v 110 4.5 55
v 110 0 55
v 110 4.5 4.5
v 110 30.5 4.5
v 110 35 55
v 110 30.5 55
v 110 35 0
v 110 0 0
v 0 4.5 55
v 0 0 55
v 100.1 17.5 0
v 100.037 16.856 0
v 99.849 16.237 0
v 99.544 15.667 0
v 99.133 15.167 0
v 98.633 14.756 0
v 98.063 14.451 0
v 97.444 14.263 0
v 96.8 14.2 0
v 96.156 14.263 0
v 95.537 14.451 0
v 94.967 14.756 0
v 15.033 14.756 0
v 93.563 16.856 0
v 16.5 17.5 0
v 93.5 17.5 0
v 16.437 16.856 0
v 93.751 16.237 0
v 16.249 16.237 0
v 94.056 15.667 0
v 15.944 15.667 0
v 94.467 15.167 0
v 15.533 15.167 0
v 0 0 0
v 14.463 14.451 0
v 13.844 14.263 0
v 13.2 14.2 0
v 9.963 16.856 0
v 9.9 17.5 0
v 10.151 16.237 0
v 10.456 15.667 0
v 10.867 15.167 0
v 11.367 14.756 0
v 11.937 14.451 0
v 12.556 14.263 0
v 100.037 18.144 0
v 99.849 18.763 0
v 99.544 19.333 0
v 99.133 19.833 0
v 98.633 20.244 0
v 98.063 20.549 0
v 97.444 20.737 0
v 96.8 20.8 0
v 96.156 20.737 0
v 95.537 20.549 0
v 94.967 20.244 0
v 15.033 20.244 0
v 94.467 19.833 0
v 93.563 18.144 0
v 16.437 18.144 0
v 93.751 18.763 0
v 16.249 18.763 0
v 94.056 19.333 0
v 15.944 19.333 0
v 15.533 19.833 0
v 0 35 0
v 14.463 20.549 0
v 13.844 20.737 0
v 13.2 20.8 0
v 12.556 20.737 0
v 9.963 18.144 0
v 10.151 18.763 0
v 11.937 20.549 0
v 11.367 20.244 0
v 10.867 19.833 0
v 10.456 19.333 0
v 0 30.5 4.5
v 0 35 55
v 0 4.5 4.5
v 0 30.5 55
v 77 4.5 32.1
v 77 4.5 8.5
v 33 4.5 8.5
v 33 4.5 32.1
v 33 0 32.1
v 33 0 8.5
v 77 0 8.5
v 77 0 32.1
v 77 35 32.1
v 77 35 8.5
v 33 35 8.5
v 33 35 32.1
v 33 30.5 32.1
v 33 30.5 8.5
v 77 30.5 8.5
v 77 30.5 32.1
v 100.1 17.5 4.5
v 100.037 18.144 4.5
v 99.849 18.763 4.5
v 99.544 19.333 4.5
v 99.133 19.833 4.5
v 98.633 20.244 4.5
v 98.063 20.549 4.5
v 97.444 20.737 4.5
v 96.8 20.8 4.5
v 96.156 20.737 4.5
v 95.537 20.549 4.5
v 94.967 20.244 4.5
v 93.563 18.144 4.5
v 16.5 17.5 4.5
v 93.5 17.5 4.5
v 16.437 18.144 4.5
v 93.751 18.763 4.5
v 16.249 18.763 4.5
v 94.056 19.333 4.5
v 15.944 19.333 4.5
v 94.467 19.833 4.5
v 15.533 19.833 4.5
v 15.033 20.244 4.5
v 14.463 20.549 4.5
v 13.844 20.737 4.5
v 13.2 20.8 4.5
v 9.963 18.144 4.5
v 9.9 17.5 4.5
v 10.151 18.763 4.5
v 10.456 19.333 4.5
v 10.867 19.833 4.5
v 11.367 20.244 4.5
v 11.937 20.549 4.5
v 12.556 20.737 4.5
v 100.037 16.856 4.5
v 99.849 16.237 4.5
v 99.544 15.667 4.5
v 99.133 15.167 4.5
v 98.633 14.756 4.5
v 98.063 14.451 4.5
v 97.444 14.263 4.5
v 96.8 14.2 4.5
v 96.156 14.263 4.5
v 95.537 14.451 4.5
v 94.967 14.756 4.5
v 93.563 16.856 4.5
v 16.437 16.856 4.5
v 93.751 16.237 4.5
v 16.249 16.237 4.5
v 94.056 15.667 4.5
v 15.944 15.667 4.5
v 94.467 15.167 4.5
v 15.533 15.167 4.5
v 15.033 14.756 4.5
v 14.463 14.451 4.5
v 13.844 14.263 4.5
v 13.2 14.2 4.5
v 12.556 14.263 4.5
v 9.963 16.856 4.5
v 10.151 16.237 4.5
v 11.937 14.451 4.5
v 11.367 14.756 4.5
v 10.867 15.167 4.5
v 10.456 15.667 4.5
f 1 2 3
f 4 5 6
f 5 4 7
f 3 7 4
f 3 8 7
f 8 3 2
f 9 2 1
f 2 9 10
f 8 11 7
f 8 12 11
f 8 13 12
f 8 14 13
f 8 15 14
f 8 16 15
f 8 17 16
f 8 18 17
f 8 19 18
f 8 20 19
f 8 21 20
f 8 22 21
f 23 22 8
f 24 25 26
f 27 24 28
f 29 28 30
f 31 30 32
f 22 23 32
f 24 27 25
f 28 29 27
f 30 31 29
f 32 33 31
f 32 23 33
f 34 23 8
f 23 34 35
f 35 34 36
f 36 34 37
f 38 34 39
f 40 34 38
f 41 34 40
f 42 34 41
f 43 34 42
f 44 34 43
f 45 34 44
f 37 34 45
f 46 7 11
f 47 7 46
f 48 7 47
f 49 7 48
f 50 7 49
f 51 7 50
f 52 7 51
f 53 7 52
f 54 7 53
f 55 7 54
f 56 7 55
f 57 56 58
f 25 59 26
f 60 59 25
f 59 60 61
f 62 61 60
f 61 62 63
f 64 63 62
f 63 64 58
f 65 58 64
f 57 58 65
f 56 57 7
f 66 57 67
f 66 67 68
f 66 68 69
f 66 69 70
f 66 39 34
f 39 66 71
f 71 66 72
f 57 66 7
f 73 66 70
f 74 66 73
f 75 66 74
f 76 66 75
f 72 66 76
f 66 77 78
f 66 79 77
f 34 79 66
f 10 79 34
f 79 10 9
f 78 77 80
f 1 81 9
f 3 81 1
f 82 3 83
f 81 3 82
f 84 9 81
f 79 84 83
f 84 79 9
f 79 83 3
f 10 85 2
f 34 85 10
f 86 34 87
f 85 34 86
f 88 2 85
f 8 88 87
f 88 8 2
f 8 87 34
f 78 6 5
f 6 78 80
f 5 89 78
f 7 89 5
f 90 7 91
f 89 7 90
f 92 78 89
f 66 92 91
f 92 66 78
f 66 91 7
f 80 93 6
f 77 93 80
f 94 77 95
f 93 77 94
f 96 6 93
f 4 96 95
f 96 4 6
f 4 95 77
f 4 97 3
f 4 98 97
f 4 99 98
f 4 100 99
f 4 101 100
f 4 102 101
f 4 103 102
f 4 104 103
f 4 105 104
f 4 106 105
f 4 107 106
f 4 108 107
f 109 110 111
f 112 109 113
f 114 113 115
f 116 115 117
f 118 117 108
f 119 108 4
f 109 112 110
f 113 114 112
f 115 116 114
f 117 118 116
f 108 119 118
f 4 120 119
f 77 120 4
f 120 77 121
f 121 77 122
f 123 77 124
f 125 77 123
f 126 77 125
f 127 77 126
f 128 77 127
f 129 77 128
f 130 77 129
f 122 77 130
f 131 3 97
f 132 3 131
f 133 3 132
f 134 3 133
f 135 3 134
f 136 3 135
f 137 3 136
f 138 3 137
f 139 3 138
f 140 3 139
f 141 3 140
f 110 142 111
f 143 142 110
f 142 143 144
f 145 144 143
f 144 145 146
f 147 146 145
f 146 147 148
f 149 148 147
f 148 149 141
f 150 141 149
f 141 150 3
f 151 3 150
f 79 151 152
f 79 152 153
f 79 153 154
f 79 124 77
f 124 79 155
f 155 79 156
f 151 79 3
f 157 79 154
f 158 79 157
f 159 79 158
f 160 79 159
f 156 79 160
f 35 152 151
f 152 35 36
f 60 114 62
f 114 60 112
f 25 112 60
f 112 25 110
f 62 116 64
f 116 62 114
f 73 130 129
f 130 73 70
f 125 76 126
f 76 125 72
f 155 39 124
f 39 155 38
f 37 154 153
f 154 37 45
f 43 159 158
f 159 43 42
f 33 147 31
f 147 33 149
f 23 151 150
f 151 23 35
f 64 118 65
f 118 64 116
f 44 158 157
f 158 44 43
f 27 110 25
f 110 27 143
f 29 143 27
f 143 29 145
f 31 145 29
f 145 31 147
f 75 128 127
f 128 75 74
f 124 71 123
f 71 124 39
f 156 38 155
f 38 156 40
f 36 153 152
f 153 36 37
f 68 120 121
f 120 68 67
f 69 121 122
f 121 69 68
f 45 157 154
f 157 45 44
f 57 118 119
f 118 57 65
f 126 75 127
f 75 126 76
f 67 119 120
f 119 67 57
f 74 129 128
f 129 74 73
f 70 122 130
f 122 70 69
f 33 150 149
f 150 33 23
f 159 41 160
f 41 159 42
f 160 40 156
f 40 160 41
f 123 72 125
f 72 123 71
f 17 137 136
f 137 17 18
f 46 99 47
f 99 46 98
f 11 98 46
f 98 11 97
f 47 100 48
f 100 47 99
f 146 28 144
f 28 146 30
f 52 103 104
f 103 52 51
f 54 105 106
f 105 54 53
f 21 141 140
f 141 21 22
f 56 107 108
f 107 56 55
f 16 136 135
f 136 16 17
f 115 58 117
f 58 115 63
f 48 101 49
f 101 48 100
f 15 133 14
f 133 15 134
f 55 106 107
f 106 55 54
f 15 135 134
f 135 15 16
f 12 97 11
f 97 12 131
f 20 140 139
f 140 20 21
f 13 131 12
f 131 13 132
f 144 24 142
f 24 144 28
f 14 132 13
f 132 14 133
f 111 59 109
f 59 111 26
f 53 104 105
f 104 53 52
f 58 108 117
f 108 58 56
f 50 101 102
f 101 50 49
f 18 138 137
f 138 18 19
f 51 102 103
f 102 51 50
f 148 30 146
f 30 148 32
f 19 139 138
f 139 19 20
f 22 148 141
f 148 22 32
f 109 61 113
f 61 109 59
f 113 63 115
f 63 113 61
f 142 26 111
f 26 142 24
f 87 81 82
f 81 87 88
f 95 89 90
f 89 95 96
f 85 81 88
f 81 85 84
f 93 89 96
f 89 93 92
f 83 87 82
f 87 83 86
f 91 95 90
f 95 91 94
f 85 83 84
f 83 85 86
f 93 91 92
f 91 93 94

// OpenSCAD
$fn = 32;

// ----------------------------------------------------------------------
// U-bracket: 110 x 35 x 55 mm
// ----------------------------------------------------------------------

// --- parameters (mm) ---
length = 110;             // outer length, X
width = 35;               // outer width, Y
height = 55;              // upright height, Z
thick = 4.5;              // wall thickness
hole_d = 6.6;             // clearance for M6
window_l = 44;            // window length
window_h = 23.6;          // window height

module hole_z(px, py) {
  translate([px, py, -0.5]) cylinder(h = thick + 1, d = hole_d);
}
module hole_y_pz(pz) {
  /* through both uprights along Y */
  translate([0, -0.5, pz]) rotate([-90, 0, 0]) cylinder(h = width + 1, d = hole_d);
}

module base() {
  cube([length, width, thick]);
}

module uprights() {
  cube([length, thick, height]);
  translate([0, width - thick, 0]) cube([length, thick, height]);
}

difference() {
  union() {
    base();
    uprights();
  }
  hole_z(13.2, 17.5);
  hole_z(96.8, 17.5);
  /* lightening window through both uprights */
  translate([length / 2 - window_l / 2, -1, thick + 4])
    cube([window_l, width + 2, window_h]);
}
